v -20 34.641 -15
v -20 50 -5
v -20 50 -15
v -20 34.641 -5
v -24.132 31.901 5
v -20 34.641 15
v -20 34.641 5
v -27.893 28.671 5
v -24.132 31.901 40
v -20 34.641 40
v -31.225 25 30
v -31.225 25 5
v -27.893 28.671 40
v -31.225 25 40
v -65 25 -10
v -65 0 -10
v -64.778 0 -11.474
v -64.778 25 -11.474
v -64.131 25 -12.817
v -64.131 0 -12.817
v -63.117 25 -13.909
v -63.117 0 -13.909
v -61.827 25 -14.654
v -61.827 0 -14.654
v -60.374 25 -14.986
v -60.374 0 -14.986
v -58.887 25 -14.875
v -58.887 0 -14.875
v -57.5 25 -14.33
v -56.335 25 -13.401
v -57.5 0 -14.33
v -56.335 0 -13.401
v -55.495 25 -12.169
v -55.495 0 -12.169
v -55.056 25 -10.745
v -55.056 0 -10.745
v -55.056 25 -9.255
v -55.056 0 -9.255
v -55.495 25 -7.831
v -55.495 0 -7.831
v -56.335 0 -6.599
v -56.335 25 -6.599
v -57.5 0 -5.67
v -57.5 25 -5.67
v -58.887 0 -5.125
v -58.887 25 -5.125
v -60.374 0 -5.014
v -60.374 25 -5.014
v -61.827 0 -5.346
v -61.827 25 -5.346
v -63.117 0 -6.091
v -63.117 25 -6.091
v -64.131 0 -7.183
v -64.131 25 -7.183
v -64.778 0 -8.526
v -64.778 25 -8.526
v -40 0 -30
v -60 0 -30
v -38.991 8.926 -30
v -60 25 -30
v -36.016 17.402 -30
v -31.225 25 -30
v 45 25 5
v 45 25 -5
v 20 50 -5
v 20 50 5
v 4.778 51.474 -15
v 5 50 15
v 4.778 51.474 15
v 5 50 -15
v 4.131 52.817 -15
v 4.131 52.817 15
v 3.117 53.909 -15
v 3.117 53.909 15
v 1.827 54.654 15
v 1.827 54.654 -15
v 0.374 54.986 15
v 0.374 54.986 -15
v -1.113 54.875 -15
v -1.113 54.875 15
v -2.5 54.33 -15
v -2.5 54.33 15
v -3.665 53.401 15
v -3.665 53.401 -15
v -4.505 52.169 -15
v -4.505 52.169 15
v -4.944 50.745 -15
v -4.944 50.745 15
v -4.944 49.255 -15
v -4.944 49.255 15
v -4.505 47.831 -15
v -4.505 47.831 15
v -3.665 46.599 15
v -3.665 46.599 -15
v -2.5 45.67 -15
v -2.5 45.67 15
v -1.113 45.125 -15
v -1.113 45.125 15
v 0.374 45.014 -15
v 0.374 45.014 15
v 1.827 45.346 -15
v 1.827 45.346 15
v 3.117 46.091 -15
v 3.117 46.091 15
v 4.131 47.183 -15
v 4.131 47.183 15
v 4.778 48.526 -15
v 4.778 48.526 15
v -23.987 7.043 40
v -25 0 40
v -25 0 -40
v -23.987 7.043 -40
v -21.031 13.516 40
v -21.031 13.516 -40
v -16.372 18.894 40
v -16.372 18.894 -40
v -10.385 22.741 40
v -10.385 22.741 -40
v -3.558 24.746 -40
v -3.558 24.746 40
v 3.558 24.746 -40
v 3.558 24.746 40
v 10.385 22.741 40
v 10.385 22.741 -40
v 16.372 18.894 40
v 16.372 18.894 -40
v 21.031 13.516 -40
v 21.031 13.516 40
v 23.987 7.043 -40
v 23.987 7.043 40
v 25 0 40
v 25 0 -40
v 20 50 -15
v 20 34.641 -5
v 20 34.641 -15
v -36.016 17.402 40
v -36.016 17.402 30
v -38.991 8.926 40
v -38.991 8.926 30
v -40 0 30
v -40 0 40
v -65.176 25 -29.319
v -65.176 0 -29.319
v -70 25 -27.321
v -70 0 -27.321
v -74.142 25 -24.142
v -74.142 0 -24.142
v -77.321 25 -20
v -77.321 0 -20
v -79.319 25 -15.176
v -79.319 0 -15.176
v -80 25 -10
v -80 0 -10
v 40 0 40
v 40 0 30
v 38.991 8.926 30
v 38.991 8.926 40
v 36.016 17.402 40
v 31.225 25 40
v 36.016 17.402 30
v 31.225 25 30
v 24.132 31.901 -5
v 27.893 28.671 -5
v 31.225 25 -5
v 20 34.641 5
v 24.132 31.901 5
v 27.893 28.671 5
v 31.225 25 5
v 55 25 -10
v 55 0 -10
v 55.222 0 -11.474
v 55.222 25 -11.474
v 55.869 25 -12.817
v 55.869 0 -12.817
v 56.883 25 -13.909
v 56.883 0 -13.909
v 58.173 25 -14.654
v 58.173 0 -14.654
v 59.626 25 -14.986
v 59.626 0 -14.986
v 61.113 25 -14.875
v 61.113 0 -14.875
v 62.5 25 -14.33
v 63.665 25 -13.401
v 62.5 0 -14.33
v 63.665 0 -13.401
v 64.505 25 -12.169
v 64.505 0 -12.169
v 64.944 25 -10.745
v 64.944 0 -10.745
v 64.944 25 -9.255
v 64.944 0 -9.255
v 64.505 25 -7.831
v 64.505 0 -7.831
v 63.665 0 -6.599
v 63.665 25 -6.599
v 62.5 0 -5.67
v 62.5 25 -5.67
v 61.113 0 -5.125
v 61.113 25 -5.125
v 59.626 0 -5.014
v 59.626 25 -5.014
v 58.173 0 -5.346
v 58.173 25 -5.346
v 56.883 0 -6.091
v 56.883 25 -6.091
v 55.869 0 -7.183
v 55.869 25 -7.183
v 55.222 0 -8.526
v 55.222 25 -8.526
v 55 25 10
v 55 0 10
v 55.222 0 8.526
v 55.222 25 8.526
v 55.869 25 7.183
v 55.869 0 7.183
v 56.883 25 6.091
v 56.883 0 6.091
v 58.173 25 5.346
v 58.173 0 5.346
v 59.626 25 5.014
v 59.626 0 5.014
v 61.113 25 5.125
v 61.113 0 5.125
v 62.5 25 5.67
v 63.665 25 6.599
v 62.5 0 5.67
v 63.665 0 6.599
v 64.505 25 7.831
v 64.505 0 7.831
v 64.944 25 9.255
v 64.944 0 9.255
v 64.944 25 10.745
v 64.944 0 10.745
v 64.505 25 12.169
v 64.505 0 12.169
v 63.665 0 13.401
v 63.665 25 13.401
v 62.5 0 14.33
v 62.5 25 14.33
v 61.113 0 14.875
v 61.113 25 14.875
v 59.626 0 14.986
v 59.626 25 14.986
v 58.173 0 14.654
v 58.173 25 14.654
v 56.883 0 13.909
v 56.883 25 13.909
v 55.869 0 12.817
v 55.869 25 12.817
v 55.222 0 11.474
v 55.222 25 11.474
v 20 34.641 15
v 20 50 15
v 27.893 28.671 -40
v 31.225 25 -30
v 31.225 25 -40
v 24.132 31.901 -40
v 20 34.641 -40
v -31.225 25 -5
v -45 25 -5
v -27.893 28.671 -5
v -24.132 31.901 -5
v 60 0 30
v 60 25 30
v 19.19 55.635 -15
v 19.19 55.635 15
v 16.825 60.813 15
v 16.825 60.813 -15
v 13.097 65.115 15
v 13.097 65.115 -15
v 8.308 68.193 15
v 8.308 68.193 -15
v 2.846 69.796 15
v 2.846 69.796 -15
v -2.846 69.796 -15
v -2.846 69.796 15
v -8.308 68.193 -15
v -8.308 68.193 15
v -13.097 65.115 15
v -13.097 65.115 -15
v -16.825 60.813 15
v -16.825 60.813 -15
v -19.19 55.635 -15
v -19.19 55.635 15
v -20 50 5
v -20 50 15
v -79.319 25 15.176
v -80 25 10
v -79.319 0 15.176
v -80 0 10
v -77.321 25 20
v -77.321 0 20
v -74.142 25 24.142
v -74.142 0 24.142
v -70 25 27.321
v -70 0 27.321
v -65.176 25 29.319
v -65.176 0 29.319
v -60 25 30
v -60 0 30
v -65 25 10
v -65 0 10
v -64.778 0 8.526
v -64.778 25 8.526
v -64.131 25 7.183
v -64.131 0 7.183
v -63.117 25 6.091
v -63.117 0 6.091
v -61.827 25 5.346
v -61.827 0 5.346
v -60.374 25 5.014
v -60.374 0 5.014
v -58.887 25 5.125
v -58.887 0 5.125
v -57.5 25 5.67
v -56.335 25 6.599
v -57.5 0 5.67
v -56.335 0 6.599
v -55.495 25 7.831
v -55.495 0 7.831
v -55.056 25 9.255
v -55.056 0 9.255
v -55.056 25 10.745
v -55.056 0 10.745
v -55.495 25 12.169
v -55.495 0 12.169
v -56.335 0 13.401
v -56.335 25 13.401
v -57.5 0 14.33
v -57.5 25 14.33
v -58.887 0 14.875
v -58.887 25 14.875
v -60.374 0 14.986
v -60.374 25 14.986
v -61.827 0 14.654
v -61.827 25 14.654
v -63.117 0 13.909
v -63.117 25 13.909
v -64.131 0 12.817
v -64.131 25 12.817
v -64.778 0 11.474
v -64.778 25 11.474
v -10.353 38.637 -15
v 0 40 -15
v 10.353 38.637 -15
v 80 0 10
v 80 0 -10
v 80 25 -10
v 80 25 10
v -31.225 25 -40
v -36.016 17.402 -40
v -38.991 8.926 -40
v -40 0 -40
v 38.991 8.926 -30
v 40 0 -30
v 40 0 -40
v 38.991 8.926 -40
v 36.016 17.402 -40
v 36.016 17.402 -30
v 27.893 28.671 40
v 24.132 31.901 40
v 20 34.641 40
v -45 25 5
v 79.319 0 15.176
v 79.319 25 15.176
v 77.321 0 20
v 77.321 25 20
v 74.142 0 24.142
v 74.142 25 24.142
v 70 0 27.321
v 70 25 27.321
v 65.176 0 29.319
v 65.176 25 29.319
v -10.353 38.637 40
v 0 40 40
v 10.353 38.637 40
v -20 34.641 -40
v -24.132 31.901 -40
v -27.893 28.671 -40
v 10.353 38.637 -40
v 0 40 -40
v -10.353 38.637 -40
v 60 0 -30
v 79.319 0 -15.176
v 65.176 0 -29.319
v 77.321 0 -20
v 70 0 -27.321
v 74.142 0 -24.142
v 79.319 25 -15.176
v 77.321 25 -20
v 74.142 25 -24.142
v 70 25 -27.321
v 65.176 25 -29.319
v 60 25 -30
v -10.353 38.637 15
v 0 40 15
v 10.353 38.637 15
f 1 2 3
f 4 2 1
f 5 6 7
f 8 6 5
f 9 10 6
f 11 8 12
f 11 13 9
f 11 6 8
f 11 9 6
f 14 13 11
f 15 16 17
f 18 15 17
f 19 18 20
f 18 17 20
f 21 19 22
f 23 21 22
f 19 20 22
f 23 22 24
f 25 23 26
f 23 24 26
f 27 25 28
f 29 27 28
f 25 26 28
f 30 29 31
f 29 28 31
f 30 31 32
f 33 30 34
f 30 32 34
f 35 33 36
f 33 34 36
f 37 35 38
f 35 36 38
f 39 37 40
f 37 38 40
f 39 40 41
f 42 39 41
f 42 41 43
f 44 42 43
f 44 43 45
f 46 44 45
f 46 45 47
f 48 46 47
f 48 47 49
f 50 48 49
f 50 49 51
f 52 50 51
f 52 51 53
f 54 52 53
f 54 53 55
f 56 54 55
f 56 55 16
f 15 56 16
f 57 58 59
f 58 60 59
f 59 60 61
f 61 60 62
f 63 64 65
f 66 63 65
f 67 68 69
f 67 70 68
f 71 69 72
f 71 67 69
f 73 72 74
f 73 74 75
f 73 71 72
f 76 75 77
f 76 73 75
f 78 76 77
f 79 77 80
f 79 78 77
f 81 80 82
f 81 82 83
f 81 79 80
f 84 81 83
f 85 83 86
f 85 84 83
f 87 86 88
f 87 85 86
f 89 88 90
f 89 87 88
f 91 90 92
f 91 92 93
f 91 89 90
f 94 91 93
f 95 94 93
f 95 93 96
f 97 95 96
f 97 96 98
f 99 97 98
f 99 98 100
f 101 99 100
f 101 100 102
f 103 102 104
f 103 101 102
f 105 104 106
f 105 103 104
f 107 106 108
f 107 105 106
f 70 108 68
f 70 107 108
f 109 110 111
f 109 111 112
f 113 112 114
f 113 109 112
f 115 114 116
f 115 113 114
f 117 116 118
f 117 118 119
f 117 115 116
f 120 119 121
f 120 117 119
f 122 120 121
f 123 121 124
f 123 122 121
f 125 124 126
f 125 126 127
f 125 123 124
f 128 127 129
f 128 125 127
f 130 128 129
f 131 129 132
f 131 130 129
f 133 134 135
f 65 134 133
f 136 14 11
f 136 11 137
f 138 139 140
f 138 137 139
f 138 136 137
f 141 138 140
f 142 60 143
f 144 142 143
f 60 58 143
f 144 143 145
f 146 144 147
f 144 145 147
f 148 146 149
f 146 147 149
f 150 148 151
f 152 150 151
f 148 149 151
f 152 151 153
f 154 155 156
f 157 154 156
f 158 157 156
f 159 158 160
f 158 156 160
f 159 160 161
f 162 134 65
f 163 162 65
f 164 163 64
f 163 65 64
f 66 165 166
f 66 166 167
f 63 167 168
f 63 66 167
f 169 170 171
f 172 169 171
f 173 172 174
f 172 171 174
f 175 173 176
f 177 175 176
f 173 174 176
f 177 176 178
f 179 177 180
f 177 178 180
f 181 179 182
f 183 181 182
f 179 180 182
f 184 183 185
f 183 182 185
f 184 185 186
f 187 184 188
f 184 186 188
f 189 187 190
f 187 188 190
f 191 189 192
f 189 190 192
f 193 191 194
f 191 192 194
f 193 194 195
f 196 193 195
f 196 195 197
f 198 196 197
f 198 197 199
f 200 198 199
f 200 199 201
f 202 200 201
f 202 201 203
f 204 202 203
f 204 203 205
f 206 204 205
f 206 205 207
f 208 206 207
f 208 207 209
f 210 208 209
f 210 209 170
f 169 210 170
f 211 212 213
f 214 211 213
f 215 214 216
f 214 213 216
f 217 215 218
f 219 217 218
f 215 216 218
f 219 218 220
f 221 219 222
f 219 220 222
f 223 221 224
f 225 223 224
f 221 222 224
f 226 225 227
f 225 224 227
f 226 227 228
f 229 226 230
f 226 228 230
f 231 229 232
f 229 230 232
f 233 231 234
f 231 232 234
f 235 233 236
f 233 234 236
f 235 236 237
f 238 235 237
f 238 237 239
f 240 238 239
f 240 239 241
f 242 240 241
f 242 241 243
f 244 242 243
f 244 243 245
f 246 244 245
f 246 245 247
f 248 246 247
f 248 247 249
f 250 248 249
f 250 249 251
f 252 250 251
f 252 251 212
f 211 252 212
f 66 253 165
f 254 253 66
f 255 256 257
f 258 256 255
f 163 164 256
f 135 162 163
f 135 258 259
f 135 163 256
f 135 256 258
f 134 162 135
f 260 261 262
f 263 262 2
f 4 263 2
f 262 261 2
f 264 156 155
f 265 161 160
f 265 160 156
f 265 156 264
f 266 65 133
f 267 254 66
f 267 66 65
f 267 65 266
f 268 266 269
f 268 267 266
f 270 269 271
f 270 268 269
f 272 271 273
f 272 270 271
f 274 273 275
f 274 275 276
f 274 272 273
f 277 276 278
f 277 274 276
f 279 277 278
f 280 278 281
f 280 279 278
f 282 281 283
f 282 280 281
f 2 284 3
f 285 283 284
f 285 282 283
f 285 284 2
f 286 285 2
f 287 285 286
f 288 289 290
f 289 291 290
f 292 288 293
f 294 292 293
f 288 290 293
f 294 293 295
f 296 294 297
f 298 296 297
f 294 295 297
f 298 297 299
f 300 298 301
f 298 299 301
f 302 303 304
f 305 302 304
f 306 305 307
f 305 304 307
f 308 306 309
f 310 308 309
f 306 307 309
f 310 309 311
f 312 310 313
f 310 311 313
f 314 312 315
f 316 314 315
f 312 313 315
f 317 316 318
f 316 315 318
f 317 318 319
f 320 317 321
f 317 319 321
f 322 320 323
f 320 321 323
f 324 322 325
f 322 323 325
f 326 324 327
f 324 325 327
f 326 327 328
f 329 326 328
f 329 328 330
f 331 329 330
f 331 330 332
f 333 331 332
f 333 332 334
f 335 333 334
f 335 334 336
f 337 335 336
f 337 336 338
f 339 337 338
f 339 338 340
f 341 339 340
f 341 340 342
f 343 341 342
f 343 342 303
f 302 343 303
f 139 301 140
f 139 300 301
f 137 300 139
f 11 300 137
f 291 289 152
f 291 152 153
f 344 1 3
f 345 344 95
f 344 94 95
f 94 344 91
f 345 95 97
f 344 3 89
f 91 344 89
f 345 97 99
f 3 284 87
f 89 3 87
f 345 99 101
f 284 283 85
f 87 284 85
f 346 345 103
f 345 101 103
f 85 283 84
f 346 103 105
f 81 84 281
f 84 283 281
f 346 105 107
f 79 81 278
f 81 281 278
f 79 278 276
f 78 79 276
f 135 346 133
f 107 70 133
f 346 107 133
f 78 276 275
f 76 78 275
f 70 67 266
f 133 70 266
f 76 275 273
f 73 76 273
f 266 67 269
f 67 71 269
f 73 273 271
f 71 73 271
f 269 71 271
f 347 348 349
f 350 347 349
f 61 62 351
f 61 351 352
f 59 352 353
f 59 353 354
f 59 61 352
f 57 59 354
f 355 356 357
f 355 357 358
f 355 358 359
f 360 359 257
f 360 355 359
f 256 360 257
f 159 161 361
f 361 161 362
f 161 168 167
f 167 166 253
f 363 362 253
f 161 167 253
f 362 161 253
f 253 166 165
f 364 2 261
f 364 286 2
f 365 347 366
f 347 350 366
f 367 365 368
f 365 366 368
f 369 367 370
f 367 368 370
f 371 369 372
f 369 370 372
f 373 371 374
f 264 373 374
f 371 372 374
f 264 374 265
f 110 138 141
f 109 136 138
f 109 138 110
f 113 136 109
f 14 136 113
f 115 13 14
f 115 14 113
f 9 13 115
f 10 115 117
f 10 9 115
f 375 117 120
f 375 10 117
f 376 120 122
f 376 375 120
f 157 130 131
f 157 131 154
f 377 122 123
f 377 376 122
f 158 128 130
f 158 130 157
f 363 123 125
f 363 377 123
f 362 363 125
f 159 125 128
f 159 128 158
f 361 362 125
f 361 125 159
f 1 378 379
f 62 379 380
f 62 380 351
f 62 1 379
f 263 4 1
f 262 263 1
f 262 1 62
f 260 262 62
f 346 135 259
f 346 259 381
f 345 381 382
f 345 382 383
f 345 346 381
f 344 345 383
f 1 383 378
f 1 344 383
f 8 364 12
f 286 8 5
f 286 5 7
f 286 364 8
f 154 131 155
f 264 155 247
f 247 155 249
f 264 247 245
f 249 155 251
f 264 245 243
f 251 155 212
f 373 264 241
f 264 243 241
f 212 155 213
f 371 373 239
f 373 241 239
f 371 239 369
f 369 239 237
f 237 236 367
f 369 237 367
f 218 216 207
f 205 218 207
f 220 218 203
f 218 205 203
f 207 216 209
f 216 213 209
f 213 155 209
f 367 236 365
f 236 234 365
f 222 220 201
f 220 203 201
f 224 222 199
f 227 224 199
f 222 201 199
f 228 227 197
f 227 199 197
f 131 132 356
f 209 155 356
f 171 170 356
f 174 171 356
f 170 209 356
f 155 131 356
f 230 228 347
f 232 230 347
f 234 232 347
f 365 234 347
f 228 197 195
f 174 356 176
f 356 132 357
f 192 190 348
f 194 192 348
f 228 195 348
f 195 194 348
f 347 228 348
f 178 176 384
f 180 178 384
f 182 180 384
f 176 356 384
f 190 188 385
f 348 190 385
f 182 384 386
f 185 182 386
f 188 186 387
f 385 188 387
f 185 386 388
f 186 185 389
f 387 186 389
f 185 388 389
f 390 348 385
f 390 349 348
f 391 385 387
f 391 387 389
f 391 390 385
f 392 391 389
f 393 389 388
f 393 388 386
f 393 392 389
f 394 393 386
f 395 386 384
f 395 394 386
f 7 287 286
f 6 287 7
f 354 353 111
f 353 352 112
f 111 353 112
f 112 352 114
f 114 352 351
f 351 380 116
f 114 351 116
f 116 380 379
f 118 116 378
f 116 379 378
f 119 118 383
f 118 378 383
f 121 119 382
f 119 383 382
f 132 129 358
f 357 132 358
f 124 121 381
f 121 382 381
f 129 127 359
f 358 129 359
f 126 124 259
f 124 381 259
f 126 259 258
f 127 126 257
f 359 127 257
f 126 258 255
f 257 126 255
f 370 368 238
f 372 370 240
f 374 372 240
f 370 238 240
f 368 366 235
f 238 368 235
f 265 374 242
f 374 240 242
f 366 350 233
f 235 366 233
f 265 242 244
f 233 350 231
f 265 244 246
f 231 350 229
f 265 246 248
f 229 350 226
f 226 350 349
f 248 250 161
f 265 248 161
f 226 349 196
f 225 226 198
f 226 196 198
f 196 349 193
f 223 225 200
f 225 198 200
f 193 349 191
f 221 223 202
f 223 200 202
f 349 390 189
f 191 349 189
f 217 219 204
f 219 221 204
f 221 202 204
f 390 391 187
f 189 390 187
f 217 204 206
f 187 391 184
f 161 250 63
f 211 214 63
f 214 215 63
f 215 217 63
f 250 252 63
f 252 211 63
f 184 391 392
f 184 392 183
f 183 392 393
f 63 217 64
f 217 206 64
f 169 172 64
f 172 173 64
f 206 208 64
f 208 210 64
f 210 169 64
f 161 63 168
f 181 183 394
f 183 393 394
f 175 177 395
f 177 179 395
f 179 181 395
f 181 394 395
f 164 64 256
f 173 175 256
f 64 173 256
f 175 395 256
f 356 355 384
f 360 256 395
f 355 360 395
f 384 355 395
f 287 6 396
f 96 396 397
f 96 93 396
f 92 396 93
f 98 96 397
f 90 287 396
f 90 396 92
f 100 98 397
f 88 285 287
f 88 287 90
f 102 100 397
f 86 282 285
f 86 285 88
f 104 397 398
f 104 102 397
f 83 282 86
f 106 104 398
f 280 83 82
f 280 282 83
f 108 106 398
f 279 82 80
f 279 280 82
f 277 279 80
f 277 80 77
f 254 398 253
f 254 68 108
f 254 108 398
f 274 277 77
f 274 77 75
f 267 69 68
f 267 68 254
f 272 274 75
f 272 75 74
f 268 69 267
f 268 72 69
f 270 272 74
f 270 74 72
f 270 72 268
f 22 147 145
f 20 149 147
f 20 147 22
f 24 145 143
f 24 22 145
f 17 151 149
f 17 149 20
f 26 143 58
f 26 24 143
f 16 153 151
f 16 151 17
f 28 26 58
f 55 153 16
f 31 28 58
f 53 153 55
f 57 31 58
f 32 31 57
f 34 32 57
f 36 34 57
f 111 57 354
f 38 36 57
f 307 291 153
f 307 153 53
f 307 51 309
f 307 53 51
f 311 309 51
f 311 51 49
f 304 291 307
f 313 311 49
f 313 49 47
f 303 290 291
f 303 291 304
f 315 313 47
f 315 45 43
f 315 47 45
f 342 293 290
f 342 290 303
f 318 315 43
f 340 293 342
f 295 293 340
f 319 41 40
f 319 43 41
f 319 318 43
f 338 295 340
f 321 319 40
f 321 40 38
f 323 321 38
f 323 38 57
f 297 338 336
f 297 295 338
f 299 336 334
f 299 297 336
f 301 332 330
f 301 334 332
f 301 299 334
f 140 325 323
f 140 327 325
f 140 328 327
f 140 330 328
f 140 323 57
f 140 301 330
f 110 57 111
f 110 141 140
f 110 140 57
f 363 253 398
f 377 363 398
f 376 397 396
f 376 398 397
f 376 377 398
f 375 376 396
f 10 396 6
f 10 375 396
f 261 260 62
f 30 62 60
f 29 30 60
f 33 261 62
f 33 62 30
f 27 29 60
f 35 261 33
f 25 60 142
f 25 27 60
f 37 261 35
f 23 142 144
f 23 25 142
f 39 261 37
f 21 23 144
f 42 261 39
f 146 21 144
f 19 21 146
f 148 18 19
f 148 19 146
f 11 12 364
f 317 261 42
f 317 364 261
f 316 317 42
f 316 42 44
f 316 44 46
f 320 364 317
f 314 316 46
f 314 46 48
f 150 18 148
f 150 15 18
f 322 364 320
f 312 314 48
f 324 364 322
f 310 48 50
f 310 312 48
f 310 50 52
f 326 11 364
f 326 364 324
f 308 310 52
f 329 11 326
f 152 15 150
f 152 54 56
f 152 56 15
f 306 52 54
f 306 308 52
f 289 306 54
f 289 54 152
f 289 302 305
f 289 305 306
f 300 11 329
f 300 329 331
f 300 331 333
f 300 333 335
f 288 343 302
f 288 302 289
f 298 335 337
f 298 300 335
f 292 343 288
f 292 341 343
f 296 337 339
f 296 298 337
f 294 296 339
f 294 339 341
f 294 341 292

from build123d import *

# Parameters (mm, degrees)
BOSS_EXTRUDE1_DEPTH        = 40
BOSS_EXTRUDE2_DEPTH        = 30
BOSS_EXTRUDE3_DEPTH        = 5
SKETCH1_6_R                = 5
BOSS_EXTRUDE4_DEPTH        = 15
F_10_0_10_DIAMETER_HOLE1_D = 10
FILLET2_R                  = 20


with BuildPart() as part:
    # Sketch1 → Boss-Extrude1 (new, symmetric)
    with BuildSketch(Plane.XY):
        with BuildLine():
            ThreePointArc((-31.224989992, 25), (-37.742546282, 13.247648854), (-40, 0))
            Line((-40, 0), (-25, 0))
            ThreePointArc((-25, 0), (0, 25), (25, 0))
            Line((25, 0), (40, 0))
            ThreePointArc((40, 0), (37.742546282, 13.247648854), (31.224989992, 25))
            ThreePointArc((31.224989992, 25), (26.062179457, 30.344073589), (20, 34.641016151))
            ThreePointArc((20, 34.641016151), (0, 40), (-20, 34.641016151))
            ThreePointArc((-20, 34.641016151), (-26.062179457, 30.344073589), (-31.224989992, 25))
        make_face()
    extrude(amount=BOSS_EXTRUDE1_DEPTH, both=True)

    # Sketch1<3> → Boss-Extrude2 (add, symmetric)
    with BuildSketch(Plane.XY):
        with BuildLine():
            Line((-80, 25), (-80, 0))
            Line((-80, 0), (-40, 0))
            ThreePointArc((-40, 0), (-37.742546282, 13.247648854), (-31.224989992, 25))
            Line((-31.224989992, 25), (-80, 25))
        make_face()
        with BuildLine():
            ThreePointArc((31.224989992, 25), (37.742546282, 13.247648854), (40, 0))
            Line((40, 0), (80, 0))
            Line((80, 0), (80, 25))
            Line((80, 25), (31.224989992, 25))
        make_face()
    extrude(amount=BOSS_EXTRUDE2_DEPTH, both=True)

    # Sketch1<5> → Boss-Extrude3 (add, symmetric)
    with BuildSketch(Plane.XY):
        with BuildLine():
            Line((-45, 25), (-31.224989992, 25))
            ThreePointArc((-31.224989992, 25), (-26.062179457, 30.344073589), (-20, 34.641016151))
            Line((-20, 34.641016151), (-20, 50))
            Line((-20, 50), (-45, 25))
        make_face()
        with BuildLine():
            Line((20, 50), (20, 34.641016151))
            ThreePointArc((20, 34.641016151), (26.062179457, 30.344073589), (31.224989992, 25))
            Line((31.224989992, 25), (45, 25))
            Line((45, 25), (20, 50))
        make_face()
    extrude(amount=BOSS_EXTRUDE3_DEPTH, both=True)

    # Sketch1<6> → Boss-Extrude4 (add, symmetric)
    with BuildSketch(Plane.XY):
        with BuildLine():
            Line((-20, 50), (-20, 34.641016151))
            ThreePointArc((-20, 34.641016151), (0, 40), (20, 34.641016151))
            Line((20, 34.641016151), (20, 50))
            ThreePointArc((20, 50), (0, 70), (-20, 50))
        make_face()
        with Locations((0, 50)):
            Circle(SKETCH1_6_R, mode=Mode.SUBTRACT)
    extrude(amount=BOSS_EXTRUDE4_DEPTH, both=True)

    # Ø10.0 (10) Diameter Hole1 (through all)
    with Locations(Plane(origin=(-60, 25, -10), x_dir=(1, 0, 0), z_dir=(0, 1, 0))):
        with Locations((0, 0), (0, -20), (120, -20), (120, 0)):
            Hole(F_10_0_10_DIAMETER_HOLE1_D / 2)

    # Fillet2
    fillet2_edges = [part.edges().sort_by_distance(p)[0] for p in [
        (80, 12.5, -30),
        (80, 12.5, 30),
        (-80, 12.5, 30),
        (-80, 12.5, -30),
    ]]
    fillet(fillet2_edges, radius=FILLET2_R)


solid = part.part
